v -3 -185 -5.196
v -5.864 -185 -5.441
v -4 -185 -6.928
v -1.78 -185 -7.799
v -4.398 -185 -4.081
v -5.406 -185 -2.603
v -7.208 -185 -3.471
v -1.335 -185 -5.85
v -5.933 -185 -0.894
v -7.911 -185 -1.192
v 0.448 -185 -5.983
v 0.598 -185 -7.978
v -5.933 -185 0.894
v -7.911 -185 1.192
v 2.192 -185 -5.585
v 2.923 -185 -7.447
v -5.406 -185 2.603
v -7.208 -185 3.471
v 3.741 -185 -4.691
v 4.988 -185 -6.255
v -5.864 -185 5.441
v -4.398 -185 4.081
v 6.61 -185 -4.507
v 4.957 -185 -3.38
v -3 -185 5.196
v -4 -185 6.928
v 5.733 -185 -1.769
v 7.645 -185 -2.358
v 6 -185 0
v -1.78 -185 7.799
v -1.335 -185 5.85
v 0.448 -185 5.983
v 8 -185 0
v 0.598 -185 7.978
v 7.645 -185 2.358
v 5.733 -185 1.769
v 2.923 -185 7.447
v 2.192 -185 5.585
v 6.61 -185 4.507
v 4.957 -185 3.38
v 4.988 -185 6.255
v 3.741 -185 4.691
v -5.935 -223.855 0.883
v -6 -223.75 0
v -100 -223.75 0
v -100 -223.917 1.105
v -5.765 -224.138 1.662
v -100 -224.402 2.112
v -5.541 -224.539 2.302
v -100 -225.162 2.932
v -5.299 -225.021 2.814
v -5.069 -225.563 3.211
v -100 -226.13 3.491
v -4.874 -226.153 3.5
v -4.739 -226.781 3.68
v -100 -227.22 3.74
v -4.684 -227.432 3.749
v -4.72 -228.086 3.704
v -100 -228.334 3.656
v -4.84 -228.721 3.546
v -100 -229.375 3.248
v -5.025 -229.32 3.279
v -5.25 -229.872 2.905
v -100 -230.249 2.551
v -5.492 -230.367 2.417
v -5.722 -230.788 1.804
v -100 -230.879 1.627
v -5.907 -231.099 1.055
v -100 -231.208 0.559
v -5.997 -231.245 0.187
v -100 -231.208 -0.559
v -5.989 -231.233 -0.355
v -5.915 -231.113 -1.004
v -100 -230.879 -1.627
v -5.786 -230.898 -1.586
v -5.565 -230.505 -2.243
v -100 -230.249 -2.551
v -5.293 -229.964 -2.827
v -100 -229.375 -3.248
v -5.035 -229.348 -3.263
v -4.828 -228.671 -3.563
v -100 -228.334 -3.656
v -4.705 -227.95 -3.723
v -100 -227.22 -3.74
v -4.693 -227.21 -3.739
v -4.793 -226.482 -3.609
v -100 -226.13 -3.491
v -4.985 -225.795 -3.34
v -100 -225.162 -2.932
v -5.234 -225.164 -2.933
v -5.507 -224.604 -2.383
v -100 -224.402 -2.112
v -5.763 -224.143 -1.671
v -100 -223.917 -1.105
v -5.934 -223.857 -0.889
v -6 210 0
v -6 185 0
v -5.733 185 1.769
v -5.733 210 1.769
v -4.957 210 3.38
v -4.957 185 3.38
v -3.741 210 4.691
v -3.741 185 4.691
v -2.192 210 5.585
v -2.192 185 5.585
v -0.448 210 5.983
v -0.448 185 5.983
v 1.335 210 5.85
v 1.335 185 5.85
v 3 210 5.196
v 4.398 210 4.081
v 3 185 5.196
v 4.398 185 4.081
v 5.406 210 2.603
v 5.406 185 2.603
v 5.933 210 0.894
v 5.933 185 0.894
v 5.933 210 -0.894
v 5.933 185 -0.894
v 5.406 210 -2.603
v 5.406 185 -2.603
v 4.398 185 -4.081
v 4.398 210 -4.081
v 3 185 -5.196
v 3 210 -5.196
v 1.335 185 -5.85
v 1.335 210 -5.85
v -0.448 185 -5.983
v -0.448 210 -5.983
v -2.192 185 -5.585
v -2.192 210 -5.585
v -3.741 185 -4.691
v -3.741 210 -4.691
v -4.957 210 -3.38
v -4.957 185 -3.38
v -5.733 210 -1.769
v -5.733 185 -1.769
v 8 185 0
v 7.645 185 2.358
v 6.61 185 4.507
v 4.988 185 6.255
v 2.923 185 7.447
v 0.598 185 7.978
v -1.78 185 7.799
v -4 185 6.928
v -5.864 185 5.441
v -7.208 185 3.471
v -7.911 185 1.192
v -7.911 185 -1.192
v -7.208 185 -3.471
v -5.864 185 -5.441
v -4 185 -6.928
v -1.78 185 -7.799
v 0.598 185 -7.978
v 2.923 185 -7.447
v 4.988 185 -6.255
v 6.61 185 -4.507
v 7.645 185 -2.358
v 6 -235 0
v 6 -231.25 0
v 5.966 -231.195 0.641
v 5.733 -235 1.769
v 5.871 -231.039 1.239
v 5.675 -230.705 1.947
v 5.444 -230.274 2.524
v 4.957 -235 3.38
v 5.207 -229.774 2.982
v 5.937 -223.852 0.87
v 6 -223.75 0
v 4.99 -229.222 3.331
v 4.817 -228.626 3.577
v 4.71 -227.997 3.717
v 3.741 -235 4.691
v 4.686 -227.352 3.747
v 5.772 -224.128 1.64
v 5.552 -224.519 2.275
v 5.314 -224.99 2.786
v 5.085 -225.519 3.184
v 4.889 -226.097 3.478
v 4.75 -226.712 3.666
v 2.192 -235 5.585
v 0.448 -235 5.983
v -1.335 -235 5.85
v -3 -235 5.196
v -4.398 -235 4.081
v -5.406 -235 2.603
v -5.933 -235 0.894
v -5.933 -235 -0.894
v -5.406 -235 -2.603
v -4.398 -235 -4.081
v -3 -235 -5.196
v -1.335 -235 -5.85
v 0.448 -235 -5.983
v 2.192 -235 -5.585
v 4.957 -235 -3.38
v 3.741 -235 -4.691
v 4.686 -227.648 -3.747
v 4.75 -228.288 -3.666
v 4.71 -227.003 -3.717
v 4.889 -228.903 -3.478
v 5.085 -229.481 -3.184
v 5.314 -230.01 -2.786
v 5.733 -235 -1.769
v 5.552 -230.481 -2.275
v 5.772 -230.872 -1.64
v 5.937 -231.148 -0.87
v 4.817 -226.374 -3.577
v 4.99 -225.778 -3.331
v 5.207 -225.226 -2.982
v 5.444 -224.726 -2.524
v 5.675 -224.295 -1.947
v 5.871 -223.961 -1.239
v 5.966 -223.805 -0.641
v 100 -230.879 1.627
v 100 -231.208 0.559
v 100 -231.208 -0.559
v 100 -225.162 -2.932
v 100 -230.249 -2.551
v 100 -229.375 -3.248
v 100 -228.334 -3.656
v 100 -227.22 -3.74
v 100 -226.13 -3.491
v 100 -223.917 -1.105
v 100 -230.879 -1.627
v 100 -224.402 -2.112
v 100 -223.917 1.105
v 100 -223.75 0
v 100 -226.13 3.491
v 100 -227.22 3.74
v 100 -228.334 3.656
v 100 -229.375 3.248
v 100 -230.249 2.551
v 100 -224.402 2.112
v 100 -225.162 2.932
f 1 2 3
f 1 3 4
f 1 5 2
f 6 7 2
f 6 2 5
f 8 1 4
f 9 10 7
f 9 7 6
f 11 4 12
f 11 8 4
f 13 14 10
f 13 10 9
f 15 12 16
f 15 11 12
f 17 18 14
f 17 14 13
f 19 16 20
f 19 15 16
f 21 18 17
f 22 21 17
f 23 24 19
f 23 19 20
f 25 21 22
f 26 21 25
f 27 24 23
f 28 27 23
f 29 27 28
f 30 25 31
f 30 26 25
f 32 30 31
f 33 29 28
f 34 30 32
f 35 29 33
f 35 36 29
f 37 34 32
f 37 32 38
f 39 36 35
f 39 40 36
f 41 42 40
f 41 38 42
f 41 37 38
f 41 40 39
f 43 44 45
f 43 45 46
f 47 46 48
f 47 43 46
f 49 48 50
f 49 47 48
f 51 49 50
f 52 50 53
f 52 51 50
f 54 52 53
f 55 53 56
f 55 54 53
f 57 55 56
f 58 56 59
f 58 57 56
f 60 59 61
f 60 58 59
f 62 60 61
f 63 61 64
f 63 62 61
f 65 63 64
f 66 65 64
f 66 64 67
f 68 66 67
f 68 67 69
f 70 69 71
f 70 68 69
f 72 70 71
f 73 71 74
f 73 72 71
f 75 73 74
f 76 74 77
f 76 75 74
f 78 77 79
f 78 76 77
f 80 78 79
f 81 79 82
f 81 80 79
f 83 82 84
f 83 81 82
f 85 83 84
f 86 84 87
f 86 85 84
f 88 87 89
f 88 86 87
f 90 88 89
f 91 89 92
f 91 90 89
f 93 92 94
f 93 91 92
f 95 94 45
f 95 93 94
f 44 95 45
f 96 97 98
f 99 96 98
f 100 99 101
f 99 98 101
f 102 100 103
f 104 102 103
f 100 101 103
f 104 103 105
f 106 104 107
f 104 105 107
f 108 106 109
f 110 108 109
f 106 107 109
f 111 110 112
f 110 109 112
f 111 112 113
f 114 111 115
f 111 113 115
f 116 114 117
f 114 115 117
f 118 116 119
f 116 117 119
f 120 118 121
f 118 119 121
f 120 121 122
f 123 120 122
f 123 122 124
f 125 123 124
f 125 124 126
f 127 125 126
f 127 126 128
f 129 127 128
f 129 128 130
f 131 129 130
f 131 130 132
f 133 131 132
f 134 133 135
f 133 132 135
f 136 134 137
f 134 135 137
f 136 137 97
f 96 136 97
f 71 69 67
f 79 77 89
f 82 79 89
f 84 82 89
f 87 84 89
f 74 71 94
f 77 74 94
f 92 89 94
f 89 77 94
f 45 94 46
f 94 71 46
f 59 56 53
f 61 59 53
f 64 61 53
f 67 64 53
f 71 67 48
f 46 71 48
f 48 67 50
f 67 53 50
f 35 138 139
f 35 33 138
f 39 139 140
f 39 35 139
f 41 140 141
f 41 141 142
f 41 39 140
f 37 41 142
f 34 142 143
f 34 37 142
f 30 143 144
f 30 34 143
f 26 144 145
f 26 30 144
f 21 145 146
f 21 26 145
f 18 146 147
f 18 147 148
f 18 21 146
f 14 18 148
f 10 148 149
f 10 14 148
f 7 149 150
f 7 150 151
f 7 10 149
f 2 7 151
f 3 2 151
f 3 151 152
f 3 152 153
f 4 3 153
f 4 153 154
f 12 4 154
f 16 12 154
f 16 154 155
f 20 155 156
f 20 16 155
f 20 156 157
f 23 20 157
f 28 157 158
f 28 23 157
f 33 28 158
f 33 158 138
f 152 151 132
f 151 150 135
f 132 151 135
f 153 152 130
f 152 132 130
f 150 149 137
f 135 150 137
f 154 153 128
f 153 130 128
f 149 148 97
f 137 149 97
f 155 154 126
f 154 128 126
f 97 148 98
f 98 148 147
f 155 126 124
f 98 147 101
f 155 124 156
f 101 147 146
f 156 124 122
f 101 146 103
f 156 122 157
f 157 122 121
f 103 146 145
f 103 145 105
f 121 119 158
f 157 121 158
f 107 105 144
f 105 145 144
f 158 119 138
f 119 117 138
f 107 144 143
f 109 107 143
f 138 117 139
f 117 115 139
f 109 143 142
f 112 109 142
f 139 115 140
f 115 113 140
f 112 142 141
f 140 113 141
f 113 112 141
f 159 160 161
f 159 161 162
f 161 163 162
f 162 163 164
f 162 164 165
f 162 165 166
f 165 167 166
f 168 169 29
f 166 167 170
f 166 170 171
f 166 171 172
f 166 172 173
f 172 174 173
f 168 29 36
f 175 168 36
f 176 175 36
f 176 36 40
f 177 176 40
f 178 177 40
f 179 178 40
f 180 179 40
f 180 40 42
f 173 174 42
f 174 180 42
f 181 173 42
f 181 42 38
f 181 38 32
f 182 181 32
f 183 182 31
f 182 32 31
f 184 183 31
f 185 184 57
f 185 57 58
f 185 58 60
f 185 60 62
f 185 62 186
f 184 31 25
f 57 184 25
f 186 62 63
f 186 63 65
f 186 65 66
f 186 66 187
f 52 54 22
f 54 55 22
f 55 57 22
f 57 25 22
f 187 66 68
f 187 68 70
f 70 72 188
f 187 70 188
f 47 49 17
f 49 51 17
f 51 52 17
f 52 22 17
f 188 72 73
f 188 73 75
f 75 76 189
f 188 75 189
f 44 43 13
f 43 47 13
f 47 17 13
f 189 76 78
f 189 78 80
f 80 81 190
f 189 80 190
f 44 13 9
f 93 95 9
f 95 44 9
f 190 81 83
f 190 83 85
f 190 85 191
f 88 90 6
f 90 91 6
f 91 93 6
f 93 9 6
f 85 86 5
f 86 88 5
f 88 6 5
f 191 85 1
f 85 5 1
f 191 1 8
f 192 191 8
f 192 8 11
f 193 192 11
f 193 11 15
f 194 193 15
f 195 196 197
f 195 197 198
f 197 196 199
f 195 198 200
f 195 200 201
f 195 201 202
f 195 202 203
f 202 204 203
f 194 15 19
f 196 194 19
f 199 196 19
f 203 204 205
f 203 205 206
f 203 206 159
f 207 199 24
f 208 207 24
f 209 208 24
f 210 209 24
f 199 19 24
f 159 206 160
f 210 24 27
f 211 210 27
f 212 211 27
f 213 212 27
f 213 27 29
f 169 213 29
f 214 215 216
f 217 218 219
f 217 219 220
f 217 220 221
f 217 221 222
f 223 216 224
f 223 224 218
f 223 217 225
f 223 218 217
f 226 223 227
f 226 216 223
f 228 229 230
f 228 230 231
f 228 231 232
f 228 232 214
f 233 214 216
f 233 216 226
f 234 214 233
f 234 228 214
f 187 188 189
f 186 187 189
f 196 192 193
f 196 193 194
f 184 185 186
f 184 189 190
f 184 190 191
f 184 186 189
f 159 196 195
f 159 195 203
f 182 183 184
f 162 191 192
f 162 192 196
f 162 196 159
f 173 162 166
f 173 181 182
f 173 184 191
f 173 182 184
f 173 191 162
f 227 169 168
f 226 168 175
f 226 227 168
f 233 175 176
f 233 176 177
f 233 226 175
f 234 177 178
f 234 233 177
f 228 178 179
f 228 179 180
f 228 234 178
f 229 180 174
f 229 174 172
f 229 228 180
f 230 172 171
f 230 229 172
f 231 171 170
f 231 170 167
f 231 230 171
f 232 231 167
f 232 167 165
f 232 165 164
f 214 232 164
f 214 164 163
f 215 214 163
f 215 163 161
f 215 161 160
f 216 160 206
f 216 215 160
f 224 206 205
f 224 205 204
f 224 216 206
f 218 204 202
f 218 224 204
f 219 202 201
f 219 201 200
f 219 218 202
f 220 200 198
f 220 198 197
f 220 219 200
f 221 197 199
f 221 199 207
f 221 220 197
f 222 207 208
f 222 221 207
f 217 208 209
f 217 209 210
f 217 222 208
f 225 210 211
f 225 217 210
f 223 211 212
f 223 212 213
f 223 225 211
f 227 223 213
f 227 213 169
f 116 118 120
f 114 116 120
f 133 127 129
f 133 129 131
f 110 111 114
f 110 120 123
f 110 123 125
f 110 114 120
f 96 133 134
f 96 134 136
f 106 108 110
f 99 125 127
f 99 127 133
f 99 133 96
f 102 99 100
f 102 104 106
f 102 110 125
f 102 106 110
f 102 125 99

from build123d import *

# Parameters (mm, degrees)
F0_R     = 8
F0_R_2   = 6
F1_DEPTH = 185
F2_R     = 6
F4_DEPTH = 50
F3_R     = 6
F5_DEPTH = 25
F6_R     = 3.75
F7_DEPTH = 100


with BuildPart() as f1:
    # F0 (on Front) → F1 (new body, symmetric)
    with BuildSketch(Plane.XZ):
        Circle(F0_R)
        Circle(F0_R_2, mode=Mode.SUBTRACT)
        Circle(F0_R_2)
    extrude(amount=F1_DEPTH, both=True)

    # F2 (on face) → F4 (join)
    with BuildSketch(Plane.XZ.offset(185)):
        Circle(F2_R)
    extrude(amount=F4_DEPTH)

    # F3 (on face) → F5 (join)
    with BuildSketch(Plane(origin=(0, 185, 0), x_dir=(-1, 0, 0), z_dir=(0, 1, 0))):
        Circle(F3_R)
    extrude(amount=F5_DEPTH)

    # F6 (on Right) → F7 (join, symmetric)
    with BuildSketch(Plane.YZ):
        with Locations((-227.5, 0)):
            Circle(F6_R)
    extrude(amount=F7_DEPTH, both=True)


solid = f1.part
